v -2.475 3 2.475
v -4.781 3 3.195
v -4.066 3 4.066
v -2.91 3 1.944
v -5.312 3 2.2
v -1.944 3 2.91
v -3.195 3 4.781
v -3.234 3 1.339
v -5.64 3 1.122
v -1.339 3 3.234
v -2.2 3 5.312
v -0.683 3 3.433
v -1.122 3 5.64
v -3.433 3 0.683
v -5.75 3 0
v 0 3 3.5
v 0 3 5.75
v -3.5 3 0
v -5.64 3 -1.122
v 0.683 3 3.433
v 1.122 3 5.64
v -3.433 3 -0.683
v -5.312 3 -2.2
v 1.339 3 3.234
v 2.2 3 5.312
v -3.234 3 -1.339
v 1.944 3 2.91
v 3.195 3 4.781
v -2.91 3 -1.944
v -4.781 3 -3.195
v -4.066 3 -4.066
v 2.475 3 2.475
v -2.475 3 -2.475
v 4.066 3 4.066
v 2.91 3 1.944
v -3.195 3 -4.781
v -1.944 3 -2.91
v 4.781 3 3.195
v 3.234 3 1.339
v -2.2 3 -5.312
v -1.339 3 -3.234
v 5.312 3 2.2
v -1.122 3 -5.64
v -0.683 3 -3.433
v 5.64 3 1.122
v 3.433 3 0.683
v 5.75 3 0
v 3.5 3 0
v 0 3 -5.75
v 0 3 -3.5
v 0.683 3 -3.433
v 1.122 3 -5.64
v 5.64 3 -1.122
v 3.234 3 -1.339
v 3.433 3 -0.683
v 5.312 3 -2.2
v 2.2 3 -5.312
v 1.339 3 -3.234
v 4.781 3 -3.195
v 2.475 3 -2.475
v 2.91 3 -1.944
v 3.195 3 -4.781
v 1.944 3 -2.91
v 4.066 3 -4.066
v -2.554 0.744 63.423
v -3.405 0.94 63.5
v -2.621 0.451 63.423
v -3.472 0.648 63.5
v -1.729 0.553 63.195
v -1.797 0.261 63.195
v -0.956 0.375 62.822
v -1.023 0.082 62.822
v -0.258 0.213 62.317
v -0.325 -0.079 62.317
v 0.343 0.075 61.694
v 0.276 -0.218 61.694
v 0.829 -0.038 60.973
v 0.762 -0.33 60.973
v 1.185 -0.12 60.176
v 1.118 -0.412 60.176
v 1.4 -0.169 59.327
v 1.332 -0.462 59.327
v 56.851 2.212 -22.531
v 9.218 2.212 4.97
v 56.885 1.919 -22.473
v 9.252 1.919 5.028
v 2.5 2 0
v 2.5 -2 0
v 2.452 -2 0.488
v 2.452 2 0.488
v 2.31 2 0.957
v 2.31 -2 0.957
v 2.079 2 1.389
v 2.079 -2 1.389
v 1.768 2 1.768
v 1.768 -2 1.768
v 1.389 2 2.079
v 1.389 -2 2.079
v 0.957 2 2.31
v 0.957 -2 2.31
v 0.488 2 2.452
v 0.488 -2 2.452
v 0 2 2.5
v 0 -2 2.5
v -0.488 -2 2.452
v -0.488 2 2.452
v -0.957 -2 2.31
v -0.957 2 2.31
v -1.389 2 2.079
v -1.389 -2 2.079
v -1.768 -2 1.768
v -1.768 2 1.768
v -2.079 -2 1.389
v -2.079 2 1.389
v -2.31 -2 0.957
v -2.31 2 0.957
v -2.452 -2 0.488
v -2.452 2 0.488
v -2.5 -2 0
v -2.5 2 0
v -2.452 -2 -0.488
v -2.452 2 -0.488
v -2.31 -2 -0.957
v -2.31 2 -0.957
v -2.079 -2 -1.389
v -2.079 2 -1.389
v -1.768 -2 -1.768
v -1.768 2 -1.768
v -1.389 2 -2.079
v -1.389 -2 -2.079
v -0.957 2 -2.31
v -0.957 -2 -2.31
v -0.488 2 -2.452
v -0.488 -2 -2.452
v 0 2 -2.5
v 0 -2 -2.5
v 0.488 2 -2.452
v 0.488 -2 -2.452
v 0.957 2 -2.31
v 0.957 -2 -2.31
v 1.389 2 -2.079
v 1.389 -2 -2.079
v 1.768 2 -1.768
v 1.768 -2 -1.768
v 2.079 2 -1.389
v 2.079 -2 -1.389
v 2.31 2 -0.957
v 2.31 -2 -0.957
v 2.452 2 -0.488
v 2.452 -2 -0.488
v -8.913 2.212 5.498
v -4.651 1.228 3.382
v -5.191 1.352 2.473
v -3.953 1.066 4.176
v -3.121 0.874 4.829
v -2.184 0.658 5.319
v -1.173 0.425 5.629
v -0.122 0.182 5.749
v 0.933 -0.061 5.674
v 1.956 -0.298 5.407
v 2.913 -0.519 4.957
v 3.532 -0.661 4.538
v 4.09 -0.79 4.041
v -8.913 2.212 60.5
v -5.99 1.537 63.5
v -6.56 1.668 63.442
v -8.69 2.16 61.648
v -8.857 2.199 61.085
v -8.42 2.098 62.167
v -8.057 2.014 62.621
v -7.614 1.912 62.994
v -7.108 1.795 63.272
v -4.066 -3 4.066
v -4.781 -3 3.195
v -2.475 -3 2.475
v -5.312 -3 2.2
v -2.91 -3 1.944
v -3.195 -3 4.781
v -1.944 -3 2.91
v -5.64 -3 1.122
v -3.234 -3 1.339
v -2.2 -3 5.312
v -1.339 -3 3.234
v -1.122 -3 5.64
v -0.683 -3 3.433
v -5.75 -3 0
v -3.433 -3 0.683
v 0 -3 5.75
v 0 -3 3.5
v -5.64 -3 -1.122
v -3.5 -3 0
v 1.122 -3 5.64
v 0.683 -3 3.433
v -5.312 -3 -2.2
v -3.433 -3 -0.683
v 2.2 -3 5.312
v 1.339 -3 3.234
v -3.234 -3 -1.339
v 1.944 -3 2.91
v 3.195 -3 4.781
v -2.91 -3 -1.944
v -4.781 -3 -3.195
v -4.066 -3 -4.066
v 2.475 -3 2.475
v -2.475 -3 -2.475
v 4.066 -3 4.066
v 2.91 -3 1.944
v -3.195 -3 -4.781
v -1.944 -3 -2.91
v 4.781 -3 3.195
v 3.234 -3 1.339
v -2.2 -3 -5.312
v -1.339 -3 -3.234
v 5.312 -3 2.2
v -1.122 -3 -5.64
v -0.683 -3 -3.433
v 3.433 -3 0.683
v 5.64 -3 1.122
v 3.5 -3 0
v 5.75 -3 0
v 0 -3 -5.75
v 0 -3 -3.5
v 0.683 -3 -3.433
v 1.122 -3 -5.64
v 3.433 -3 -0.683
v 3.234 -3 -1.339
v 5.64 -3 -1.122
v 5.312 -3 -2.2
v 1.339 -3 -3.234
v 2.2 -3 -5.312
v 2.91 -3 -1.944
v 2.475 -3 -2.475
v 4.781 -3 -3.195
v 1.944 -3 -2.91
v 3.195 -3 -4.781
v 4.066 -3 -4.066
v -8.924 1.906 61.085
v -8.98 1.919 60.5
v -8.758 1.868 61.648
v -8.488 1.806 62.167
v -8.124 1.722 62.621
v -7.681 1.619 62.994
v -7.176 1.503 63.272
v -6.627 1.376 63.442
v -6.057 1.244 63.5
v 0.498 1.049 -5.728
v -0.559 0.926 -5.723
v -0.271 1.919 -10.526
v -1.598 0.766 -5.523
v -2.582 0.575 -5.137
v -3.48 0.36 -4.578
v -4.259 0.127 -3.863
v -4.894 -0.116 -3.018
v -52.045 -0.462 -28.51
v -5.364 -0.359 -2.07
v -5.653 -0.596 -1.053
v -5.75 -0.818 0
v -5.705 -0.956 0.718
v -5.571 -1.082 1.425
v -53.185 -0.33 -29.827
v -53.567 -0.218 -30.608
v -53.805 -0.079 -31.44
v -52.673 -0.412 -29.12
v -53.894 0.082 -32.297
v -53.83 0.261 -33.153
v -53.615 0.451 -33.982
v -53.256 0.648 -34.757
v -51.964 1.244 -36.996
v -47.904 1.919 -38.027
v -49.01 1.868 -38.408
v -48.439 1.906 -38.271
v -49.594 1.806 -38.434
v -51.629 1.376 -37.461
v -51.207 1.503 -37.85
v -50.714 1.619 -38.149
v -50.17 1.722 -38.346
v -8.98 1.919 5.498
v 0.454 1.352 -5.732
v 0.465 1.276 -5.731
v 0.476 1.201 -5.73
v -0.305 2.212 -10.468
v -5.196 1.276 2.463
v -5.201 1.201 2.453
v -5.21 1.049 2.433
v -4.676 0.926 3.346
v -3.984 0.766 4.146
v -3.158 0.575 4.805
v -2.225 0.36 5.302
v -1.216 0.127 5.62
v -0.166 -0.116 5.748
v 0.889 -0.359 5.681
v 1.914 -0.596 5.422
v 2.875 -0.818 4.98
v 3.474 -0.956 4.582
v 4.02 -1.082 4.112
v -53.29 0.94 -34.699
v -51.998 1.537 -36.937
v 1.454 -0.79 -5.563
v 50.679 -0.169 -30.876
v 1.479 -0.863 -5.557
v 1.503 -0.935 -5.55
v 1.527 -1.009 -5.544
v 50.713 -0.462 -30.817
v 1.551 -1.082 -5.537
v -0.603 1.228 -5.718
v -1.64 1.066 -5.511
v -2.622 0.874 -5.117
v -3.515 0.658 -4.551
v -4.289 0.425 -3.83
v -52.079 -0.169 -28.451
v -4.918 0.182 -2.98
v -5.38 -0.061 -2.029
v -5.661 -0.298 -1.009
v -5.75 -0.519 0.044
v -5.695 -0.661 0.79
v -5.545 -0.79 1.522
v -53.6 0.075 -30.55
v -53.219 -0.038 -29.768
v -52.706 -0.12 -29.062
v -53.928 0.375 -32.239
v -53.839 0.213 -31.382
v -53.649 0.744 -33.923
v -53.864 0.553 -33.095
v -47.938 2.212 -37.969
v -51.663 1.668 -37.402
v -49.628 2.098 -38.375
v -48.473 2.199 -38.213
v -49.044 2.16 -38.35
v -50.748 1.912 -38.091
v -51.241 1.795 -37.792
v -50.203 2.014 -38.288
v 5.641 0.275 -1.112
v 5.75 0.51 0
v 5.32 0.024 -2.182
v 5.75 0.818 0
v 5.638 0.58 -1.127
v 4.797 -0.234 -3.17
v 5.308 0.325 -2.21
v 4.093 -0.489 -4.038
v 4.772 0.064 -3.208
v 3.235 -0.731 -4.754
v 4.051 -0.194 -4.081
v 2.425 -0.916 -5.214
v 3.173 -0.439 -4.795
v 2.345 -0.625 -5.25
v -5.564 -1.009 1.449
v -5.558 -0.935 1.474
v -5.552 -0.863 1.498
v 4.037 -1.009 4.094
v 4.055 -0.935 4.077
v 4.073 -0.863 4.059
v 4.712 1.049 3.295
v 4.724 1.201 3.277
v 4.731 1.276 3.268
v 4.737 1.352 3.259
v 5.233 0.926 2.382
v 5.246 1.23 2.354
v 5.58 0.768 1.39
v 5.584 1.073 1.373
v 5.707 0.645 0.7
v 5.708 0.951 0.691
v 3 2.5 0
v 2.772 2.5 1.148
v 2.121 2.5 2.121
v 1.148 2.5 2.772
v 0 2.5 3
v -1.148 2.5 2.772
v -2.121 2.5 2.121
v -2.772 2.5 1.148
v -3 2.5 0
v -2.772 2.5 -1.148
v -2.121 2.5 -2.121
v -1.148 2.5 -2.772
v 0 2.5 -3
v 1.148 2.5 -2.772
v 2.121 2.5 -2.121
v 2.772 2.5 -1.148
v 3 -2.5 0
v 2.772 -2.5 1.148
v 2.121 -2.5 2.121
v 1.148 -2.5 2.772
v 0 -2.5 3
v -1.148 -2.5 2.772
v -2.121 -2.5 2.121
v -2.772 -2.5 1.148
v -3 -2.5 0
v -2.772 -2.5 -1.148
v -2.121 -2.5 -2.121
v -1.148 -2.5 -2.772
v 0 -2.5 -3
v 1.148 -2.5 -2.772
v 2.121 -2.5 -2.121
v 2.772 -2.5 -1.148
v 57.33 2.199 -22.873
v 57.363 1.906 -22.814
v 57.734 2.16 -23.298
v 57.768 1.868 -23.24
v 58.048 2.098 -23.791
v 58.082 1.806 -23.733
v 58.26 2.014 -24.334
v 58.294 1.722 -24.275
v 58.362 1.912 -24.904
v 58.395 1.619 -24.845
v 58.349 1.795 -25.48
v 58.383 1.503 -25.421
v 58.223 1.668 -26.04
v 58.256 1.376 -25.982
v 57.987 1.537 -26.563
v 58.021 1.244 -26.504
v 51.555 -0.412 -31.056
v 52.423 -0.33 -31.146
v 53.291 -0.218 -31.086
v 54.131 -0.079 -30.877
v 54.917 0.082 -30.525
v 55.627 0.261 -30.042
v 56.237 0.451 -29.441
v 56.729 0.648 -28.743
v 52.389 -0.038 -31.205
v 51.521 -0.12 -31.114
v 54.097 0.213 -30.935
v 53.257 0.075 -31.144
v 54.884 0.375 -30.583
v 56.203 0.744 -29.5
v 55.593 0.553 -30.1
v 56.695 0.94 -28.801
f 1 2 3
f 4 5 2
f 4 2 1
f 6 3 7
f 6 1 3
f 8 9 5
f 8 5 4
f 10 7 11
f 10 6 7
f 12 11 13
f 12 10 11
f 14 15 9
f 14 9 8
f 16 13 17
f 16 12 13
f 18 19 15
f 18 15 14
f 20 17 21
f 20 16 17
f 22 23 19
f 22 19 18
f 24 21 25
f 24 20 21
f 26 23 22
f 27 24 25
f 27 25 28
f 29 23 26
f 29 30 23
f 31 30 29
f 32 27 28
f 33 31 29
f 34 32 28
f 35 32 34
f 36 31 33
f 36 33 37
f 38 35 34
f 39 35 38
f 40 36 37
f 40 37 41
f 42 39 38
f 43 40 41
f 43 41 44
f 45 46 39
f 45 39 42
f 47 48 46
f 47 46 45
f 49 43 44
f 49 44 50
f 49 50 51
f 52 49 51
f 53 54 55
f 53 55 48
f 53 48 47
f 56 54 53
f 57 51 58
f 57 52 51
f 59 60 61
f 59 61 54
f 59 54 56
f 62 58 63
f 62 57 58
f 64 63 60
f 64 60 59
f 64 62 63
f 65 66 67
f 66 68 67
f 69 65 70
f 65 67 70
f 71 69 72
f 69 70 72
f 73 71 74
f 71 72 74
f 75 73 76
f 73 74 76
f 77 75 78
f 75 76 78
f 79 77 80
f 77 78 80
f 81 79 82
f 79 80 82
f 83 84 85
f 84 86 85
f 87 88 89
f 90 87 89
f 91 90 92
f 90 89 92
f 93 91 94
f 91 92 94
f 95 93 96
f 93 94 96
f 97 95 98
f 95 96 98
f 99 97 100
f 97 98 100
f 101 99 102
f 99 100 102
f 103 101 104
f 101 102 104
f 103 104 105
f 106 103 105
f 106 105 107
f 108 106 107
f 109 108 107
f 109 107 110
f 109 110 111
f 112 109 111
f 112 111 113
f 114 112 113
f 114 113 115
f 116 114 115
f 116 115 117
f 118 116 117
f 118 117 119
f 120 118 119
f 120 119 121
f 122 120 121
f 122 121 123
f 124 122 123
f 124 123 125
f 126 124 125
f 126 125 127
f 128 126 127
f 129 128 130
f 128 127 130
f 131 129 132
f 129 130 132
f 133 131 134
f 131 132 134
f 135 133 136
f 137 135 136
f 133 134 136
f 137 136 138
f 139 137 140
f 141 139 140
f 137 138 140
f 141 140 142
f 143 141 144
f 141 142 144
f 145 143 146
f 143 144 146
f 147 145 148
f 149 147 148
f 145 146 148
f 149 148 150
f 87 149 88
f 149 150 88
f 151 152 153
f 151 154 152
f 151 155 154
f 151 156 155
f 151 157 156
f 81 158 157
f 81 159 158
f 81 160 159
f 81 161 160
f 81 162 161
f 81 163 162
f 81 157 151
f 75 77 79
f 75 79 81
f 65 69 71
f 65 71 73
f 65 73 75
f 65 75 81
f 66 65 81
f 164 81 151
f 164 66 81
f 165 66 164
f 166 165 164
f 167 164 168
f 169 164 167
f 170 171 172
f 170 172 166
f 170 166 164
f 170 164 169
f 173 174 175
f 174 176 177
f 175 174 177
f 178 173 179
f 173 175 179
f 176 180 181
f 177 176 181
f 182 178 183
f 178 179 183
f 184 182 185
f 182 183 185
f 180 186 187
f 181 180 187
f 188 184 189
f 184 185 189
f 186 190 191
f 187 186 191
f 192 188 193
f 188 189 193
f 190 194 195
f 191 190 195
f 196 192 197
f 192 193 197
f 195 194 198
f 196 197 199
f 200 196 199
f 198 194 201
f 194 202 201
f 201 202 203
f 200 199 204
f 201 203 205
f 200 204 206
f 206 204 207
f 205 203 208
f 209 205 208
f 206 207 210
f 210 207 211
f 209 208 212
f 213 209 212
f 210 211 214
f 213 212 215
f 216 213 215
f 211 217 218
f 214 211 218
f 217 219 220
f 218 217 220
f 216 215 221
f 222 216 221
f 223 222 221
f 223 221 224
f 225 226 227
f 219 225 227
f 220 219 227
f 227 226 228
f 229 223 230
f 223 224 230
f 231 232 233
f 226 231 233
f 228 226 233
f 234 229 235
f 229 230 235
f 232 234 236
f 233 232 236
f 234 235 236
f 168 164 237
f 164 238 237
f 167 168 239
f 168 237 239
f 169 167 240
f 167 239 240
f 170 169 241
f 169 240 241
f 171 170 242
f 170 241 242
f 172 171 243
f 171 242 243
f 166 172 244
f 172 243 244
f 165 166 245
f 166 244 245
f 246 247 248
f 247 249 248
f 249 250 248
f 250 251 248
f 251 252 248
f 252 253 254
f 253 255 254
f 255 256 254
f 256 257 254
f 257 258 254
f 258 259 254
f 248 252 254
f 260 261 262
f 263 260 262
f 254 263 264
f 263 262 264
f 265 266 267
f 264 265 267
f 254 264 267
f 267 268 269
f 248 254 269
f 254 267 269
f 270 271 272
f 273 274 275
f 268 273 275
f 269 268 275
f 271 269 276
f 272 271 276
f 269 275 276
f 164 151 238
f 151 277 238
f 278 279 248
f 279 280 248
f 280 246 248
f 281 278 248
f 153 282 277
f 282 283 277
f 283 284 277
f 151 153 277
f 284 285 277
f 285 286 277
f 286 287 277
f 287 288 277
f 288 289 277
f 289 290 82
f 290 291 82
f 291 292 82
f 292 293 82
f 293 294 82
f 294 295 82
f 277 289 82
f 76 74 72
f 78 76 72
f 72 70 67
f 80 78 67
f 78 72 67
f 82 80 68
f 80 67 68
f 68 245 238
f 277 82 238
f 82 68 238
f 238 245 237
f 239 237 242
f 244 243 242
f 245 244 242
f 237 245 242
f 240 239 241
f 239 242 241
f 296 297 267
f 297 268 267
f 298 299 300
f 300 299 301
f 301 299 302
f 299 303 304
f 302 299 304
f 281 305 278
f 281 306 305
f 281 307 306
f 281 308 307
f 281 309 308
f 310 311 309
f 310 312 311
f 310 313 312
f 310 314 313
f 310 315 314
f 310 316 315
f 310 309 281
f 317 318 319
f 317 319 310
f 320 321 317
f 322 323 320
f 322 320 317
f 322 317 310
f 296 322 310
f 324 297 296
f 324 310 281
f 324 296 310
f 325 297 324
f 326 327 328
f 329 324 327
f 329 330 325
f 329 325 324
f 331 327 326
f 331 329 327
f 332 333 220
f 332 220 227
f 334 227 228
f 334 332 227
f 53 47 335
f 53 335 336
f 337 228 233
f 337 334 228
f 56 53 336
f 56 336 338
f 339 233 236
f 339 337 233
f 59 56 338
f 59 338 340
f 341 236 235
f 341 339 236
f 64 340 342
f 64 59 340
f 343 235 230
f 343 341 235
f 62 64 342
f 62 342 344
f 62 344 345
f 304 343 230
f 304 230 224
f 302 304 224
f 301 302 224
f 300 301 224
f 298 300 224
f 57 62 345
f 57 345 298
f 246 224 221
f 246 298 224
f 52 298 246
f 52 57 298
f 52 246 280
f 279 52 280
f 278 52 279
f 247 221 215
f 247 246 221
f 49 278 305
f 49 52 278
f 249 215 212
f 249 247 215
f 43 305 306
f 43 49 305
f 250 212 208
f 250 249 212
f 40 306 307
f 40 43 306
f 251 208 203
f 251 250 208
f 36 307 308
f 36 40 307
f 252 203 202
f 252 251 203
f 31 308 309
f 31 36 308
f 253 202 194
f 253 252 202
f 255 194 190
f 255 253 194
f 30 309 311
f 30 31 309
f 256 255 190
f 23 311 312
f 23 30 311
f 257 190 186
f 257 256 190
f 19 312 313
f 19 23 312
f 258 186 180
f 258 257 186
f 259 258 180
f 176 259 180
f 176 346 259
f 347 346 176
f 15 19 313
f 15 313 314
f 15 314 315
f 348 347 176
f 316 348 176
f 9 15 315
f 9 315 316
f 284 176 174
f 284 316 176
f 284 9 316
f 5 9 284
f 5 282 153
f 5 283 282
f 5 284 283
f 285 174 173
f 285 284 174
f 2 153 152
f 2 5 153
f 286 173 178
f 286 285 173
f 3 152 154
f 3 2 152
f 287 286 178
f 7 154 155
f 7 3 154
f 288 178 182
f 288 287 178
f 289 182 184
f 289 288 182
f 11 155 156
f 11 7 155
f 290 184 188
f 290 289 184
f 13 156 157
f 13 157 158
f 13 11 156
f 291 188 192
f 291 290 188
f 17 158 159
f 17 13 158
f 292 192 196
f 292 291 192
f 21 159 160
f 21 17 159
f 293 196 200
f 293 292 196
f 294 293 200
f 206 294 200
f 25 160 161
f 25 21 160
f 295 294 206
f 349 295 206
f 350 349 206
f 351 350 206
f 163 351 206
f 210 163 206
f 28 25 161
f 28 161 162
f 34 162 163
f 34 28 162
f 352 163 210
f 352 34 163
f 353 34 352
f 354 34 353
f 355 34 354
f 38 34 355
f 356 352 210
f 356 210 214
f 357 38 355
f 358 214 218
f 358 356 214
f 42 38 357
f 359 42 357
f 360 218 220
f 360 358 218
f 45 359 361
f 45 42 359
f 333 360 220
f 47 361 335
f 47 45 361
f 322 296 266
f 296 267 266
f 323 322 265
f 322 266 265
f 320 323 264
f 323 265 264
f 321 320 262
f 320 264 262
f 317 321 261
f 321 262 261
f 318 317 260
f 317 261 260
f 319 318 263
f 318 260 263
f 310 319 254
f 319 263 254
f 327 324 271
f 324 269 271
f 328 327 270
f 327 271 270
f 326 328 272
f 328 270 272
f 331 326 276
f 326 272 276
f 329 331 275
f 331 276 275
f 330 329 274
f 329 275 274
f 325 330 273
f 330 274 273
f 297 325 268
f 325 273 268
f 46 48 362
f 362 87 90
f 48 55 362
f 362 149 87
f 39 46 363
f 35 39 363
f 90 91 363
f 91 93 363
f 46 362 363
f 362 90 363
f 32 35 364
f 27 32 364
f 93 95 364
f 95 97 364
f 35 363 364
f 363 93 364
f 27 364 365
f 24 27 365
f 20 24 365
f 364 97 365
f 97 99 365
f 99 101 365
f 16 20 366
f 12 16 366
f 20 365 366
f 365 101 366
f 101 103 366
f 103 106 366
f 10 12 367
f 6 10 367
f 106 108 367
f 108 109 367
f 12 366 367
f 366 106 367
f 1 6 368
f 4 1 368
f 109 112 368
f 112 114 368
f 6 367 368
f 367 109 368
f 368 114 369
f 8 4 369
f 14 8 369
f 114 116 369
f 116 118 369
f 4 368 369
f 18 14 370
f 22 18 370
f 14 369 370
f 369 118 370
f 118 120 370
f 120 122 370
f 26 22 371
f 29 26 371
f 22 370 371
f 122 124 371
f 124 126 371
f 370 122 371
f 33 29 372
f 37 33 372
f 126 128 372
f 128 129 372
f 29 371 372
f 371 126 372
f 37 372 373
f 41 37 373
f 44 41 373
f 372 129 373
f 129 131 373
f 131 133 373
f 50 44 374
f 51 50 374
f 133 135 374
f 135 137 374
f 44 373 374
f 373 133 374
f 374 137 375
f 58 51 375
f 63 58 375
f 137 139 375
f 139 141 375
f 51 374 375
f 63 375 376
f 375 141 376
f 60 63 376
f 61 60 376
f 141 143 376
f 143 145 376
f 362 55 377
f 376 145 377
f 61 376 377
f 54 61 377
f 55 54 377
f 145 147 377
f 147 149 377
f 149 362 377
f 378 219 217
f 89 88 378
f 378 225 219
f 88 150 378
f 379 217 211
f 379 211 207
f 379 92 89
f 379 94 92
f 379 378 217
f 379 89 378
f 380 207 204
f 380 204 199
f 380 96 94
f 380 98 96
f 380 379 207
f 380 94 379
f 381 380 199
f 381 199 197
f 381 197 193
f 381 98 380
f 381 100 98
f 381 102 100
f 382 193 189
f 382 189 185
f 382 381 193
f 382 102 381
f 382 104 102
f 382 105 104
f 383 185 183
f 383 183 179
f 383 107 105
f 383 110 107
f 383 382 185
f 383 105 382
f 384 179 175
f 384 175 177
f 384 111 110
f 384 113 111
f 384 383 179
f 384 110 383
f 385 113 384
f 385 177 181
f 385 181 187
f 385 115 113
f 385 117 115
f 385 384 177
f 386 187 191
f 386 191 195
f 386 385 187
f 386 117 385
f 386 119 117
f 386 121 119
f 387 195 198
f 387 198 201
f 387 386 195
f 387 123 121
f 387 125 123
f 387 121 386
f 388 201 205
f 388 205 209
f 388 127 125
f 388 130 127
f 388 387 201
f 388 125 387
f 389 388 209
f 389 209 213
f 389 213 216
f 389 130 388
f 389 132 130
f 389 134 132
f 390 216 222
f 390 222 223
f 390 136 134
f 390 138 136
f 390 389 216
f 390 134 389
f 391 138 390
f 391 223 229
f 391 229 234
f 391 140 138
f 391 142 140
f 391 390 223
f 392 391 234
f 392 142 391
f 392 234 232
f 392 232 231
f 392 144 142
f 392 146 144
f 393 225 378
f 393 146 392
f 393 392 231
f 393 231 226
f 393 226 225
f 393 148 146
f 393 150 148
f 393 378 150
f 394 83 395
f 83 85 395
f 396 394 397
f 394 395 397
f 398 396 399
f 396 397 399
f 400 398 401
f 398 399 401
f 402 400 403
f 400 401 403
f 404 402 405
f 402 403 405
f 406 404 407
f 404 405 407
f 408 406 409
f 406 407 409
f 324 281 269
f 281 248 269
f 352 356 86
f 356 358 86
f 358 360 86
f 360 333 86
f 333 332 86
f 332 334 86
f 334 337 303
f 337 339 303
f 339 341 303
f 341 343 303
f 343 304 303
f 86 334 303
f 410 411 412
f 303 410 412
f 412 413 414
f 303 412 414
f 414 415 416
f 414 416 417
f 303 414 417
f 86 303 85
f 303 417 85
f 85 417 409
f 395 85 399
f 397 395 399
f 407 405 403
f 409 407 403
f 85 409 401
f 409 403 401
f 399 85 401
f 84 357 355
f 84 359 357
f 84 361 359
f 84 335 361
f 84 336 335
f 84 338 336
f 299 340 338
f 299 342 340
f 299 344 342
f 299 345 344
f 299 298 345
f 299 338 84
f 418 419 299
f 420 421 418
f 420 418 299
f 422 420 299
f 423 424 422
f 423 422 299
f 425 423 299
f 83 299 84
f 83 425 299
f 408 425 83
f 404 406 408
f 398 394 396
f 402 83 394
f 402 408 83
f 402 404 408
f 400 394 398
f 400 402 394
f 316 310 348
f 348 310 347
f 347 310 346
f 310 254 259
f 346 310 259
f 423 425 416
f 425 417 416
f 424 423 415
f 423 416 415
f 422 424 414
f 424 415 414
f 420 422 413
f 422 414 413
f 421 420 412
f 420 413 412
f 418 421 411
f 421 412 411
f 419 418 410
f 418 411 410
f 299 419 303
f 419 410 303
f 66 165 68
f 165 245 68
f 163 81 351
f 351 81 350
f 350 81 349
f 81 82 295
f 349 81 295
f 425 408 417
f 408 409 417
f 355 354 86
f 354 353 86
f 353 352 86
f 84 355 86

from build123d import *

# Parameters (mm, degrees)
SKETCH2_R           = 5.75
BOSS_EXTRUDE3_DEPTH = 3
BOSS_EXTRUDE4_DEPTH = 0.15
SKETCH10_R          = 2.5
CUT_EXTRUDE2_DEPTH  = 7
CIRPATTERN1_COUNT   = 3
CHAMFER1_SIZE       = 1


with BuildPart() as part:
    # Sketch2 → Boss-Extrude3 (new body, symmetric)
    with BuildSketch(Plane(origin=(0, 0, 0), x_dir=(1, 0, 0), z_dir=(0, 1, 0))):
        Circle(SKETCH2_R)
    extrude(amount=BOSS_EXTRUDE3_DEPTH, both=True)

    # Sketch7 → Boss-Extrude4 (add, symmetric)
    with BuildSketch(Plane(origin=(0, 0, 0), x_dir=(0.974370065, -0.224951054, 0), z_dir=(-0.224951054, -0.974370065, 0))):
        with BuildLine():
            Line((-4.618684487, 1.883456295), (-9.181754015, 5.498179334))
            Line((-9.181754015, 5.498179334), (-9.181754015, 60.5))
            ThreePointArc((-9.181754015, 60.5), (-8.303074359, 62.621320344), (-6.181754015, 63.5))
            Line((-6.181754015, 63.5), (-3.529096808, 63.5))
            ThreePointArc((-3.529096808, 63.5), (-0.299288732, 62.316849459), (1.401979675, 59.327335916))
            add(Edge.make_bspline(
                [(1.401979675, 59.327335916), (4.254001787, 2.228053108)],
                knots=[0, 0, 1, 1], degree=1))
            add(Edge.make_bspline(
                [(-4.618684487, 1.883456295), (-0.212236613, 8.938890212), (4.254001787, 2.228053108)],
                knots=[0, 0, 0, 1, 1, 1], degree=2))
        make_face()
    boss_extrude4 = extrude(amount=BOSS_EXTRUDE4_DEPTH, both=True)

    # Sketch10 → Cut-Extrude2 (cut, through all)
    with BuildSketch(Plane.XZ.offset(3)):
        Circle(SKETCH10_R)
    extrude(amount=-CUT_EXTRUDE2_DEPTH, mode=Mode.SUBTRACT)

    # CirPattern1: Boss-Extrude4 ×3 about axis
    cirpattern1_axis = Axis((0, 0, 0), (0, 1, 0))
    for i in range(1, CIRPATTERN1_COUNT):
        add(boss_extrude4.rotate(cirpattern1_axis, i * 360 / CIRPATTERN1_COUNT))

    # Chamfer1
    chamfer1_edges = [part.edges().sort_by_distance(p)[0] for p in [
        (-2.5, 3, 0),
        (-2.5, -3, 0),
    ]]
    chamfer(chamfer1_edges, length=CHAMFER1_SIZE)


solid = part.part
